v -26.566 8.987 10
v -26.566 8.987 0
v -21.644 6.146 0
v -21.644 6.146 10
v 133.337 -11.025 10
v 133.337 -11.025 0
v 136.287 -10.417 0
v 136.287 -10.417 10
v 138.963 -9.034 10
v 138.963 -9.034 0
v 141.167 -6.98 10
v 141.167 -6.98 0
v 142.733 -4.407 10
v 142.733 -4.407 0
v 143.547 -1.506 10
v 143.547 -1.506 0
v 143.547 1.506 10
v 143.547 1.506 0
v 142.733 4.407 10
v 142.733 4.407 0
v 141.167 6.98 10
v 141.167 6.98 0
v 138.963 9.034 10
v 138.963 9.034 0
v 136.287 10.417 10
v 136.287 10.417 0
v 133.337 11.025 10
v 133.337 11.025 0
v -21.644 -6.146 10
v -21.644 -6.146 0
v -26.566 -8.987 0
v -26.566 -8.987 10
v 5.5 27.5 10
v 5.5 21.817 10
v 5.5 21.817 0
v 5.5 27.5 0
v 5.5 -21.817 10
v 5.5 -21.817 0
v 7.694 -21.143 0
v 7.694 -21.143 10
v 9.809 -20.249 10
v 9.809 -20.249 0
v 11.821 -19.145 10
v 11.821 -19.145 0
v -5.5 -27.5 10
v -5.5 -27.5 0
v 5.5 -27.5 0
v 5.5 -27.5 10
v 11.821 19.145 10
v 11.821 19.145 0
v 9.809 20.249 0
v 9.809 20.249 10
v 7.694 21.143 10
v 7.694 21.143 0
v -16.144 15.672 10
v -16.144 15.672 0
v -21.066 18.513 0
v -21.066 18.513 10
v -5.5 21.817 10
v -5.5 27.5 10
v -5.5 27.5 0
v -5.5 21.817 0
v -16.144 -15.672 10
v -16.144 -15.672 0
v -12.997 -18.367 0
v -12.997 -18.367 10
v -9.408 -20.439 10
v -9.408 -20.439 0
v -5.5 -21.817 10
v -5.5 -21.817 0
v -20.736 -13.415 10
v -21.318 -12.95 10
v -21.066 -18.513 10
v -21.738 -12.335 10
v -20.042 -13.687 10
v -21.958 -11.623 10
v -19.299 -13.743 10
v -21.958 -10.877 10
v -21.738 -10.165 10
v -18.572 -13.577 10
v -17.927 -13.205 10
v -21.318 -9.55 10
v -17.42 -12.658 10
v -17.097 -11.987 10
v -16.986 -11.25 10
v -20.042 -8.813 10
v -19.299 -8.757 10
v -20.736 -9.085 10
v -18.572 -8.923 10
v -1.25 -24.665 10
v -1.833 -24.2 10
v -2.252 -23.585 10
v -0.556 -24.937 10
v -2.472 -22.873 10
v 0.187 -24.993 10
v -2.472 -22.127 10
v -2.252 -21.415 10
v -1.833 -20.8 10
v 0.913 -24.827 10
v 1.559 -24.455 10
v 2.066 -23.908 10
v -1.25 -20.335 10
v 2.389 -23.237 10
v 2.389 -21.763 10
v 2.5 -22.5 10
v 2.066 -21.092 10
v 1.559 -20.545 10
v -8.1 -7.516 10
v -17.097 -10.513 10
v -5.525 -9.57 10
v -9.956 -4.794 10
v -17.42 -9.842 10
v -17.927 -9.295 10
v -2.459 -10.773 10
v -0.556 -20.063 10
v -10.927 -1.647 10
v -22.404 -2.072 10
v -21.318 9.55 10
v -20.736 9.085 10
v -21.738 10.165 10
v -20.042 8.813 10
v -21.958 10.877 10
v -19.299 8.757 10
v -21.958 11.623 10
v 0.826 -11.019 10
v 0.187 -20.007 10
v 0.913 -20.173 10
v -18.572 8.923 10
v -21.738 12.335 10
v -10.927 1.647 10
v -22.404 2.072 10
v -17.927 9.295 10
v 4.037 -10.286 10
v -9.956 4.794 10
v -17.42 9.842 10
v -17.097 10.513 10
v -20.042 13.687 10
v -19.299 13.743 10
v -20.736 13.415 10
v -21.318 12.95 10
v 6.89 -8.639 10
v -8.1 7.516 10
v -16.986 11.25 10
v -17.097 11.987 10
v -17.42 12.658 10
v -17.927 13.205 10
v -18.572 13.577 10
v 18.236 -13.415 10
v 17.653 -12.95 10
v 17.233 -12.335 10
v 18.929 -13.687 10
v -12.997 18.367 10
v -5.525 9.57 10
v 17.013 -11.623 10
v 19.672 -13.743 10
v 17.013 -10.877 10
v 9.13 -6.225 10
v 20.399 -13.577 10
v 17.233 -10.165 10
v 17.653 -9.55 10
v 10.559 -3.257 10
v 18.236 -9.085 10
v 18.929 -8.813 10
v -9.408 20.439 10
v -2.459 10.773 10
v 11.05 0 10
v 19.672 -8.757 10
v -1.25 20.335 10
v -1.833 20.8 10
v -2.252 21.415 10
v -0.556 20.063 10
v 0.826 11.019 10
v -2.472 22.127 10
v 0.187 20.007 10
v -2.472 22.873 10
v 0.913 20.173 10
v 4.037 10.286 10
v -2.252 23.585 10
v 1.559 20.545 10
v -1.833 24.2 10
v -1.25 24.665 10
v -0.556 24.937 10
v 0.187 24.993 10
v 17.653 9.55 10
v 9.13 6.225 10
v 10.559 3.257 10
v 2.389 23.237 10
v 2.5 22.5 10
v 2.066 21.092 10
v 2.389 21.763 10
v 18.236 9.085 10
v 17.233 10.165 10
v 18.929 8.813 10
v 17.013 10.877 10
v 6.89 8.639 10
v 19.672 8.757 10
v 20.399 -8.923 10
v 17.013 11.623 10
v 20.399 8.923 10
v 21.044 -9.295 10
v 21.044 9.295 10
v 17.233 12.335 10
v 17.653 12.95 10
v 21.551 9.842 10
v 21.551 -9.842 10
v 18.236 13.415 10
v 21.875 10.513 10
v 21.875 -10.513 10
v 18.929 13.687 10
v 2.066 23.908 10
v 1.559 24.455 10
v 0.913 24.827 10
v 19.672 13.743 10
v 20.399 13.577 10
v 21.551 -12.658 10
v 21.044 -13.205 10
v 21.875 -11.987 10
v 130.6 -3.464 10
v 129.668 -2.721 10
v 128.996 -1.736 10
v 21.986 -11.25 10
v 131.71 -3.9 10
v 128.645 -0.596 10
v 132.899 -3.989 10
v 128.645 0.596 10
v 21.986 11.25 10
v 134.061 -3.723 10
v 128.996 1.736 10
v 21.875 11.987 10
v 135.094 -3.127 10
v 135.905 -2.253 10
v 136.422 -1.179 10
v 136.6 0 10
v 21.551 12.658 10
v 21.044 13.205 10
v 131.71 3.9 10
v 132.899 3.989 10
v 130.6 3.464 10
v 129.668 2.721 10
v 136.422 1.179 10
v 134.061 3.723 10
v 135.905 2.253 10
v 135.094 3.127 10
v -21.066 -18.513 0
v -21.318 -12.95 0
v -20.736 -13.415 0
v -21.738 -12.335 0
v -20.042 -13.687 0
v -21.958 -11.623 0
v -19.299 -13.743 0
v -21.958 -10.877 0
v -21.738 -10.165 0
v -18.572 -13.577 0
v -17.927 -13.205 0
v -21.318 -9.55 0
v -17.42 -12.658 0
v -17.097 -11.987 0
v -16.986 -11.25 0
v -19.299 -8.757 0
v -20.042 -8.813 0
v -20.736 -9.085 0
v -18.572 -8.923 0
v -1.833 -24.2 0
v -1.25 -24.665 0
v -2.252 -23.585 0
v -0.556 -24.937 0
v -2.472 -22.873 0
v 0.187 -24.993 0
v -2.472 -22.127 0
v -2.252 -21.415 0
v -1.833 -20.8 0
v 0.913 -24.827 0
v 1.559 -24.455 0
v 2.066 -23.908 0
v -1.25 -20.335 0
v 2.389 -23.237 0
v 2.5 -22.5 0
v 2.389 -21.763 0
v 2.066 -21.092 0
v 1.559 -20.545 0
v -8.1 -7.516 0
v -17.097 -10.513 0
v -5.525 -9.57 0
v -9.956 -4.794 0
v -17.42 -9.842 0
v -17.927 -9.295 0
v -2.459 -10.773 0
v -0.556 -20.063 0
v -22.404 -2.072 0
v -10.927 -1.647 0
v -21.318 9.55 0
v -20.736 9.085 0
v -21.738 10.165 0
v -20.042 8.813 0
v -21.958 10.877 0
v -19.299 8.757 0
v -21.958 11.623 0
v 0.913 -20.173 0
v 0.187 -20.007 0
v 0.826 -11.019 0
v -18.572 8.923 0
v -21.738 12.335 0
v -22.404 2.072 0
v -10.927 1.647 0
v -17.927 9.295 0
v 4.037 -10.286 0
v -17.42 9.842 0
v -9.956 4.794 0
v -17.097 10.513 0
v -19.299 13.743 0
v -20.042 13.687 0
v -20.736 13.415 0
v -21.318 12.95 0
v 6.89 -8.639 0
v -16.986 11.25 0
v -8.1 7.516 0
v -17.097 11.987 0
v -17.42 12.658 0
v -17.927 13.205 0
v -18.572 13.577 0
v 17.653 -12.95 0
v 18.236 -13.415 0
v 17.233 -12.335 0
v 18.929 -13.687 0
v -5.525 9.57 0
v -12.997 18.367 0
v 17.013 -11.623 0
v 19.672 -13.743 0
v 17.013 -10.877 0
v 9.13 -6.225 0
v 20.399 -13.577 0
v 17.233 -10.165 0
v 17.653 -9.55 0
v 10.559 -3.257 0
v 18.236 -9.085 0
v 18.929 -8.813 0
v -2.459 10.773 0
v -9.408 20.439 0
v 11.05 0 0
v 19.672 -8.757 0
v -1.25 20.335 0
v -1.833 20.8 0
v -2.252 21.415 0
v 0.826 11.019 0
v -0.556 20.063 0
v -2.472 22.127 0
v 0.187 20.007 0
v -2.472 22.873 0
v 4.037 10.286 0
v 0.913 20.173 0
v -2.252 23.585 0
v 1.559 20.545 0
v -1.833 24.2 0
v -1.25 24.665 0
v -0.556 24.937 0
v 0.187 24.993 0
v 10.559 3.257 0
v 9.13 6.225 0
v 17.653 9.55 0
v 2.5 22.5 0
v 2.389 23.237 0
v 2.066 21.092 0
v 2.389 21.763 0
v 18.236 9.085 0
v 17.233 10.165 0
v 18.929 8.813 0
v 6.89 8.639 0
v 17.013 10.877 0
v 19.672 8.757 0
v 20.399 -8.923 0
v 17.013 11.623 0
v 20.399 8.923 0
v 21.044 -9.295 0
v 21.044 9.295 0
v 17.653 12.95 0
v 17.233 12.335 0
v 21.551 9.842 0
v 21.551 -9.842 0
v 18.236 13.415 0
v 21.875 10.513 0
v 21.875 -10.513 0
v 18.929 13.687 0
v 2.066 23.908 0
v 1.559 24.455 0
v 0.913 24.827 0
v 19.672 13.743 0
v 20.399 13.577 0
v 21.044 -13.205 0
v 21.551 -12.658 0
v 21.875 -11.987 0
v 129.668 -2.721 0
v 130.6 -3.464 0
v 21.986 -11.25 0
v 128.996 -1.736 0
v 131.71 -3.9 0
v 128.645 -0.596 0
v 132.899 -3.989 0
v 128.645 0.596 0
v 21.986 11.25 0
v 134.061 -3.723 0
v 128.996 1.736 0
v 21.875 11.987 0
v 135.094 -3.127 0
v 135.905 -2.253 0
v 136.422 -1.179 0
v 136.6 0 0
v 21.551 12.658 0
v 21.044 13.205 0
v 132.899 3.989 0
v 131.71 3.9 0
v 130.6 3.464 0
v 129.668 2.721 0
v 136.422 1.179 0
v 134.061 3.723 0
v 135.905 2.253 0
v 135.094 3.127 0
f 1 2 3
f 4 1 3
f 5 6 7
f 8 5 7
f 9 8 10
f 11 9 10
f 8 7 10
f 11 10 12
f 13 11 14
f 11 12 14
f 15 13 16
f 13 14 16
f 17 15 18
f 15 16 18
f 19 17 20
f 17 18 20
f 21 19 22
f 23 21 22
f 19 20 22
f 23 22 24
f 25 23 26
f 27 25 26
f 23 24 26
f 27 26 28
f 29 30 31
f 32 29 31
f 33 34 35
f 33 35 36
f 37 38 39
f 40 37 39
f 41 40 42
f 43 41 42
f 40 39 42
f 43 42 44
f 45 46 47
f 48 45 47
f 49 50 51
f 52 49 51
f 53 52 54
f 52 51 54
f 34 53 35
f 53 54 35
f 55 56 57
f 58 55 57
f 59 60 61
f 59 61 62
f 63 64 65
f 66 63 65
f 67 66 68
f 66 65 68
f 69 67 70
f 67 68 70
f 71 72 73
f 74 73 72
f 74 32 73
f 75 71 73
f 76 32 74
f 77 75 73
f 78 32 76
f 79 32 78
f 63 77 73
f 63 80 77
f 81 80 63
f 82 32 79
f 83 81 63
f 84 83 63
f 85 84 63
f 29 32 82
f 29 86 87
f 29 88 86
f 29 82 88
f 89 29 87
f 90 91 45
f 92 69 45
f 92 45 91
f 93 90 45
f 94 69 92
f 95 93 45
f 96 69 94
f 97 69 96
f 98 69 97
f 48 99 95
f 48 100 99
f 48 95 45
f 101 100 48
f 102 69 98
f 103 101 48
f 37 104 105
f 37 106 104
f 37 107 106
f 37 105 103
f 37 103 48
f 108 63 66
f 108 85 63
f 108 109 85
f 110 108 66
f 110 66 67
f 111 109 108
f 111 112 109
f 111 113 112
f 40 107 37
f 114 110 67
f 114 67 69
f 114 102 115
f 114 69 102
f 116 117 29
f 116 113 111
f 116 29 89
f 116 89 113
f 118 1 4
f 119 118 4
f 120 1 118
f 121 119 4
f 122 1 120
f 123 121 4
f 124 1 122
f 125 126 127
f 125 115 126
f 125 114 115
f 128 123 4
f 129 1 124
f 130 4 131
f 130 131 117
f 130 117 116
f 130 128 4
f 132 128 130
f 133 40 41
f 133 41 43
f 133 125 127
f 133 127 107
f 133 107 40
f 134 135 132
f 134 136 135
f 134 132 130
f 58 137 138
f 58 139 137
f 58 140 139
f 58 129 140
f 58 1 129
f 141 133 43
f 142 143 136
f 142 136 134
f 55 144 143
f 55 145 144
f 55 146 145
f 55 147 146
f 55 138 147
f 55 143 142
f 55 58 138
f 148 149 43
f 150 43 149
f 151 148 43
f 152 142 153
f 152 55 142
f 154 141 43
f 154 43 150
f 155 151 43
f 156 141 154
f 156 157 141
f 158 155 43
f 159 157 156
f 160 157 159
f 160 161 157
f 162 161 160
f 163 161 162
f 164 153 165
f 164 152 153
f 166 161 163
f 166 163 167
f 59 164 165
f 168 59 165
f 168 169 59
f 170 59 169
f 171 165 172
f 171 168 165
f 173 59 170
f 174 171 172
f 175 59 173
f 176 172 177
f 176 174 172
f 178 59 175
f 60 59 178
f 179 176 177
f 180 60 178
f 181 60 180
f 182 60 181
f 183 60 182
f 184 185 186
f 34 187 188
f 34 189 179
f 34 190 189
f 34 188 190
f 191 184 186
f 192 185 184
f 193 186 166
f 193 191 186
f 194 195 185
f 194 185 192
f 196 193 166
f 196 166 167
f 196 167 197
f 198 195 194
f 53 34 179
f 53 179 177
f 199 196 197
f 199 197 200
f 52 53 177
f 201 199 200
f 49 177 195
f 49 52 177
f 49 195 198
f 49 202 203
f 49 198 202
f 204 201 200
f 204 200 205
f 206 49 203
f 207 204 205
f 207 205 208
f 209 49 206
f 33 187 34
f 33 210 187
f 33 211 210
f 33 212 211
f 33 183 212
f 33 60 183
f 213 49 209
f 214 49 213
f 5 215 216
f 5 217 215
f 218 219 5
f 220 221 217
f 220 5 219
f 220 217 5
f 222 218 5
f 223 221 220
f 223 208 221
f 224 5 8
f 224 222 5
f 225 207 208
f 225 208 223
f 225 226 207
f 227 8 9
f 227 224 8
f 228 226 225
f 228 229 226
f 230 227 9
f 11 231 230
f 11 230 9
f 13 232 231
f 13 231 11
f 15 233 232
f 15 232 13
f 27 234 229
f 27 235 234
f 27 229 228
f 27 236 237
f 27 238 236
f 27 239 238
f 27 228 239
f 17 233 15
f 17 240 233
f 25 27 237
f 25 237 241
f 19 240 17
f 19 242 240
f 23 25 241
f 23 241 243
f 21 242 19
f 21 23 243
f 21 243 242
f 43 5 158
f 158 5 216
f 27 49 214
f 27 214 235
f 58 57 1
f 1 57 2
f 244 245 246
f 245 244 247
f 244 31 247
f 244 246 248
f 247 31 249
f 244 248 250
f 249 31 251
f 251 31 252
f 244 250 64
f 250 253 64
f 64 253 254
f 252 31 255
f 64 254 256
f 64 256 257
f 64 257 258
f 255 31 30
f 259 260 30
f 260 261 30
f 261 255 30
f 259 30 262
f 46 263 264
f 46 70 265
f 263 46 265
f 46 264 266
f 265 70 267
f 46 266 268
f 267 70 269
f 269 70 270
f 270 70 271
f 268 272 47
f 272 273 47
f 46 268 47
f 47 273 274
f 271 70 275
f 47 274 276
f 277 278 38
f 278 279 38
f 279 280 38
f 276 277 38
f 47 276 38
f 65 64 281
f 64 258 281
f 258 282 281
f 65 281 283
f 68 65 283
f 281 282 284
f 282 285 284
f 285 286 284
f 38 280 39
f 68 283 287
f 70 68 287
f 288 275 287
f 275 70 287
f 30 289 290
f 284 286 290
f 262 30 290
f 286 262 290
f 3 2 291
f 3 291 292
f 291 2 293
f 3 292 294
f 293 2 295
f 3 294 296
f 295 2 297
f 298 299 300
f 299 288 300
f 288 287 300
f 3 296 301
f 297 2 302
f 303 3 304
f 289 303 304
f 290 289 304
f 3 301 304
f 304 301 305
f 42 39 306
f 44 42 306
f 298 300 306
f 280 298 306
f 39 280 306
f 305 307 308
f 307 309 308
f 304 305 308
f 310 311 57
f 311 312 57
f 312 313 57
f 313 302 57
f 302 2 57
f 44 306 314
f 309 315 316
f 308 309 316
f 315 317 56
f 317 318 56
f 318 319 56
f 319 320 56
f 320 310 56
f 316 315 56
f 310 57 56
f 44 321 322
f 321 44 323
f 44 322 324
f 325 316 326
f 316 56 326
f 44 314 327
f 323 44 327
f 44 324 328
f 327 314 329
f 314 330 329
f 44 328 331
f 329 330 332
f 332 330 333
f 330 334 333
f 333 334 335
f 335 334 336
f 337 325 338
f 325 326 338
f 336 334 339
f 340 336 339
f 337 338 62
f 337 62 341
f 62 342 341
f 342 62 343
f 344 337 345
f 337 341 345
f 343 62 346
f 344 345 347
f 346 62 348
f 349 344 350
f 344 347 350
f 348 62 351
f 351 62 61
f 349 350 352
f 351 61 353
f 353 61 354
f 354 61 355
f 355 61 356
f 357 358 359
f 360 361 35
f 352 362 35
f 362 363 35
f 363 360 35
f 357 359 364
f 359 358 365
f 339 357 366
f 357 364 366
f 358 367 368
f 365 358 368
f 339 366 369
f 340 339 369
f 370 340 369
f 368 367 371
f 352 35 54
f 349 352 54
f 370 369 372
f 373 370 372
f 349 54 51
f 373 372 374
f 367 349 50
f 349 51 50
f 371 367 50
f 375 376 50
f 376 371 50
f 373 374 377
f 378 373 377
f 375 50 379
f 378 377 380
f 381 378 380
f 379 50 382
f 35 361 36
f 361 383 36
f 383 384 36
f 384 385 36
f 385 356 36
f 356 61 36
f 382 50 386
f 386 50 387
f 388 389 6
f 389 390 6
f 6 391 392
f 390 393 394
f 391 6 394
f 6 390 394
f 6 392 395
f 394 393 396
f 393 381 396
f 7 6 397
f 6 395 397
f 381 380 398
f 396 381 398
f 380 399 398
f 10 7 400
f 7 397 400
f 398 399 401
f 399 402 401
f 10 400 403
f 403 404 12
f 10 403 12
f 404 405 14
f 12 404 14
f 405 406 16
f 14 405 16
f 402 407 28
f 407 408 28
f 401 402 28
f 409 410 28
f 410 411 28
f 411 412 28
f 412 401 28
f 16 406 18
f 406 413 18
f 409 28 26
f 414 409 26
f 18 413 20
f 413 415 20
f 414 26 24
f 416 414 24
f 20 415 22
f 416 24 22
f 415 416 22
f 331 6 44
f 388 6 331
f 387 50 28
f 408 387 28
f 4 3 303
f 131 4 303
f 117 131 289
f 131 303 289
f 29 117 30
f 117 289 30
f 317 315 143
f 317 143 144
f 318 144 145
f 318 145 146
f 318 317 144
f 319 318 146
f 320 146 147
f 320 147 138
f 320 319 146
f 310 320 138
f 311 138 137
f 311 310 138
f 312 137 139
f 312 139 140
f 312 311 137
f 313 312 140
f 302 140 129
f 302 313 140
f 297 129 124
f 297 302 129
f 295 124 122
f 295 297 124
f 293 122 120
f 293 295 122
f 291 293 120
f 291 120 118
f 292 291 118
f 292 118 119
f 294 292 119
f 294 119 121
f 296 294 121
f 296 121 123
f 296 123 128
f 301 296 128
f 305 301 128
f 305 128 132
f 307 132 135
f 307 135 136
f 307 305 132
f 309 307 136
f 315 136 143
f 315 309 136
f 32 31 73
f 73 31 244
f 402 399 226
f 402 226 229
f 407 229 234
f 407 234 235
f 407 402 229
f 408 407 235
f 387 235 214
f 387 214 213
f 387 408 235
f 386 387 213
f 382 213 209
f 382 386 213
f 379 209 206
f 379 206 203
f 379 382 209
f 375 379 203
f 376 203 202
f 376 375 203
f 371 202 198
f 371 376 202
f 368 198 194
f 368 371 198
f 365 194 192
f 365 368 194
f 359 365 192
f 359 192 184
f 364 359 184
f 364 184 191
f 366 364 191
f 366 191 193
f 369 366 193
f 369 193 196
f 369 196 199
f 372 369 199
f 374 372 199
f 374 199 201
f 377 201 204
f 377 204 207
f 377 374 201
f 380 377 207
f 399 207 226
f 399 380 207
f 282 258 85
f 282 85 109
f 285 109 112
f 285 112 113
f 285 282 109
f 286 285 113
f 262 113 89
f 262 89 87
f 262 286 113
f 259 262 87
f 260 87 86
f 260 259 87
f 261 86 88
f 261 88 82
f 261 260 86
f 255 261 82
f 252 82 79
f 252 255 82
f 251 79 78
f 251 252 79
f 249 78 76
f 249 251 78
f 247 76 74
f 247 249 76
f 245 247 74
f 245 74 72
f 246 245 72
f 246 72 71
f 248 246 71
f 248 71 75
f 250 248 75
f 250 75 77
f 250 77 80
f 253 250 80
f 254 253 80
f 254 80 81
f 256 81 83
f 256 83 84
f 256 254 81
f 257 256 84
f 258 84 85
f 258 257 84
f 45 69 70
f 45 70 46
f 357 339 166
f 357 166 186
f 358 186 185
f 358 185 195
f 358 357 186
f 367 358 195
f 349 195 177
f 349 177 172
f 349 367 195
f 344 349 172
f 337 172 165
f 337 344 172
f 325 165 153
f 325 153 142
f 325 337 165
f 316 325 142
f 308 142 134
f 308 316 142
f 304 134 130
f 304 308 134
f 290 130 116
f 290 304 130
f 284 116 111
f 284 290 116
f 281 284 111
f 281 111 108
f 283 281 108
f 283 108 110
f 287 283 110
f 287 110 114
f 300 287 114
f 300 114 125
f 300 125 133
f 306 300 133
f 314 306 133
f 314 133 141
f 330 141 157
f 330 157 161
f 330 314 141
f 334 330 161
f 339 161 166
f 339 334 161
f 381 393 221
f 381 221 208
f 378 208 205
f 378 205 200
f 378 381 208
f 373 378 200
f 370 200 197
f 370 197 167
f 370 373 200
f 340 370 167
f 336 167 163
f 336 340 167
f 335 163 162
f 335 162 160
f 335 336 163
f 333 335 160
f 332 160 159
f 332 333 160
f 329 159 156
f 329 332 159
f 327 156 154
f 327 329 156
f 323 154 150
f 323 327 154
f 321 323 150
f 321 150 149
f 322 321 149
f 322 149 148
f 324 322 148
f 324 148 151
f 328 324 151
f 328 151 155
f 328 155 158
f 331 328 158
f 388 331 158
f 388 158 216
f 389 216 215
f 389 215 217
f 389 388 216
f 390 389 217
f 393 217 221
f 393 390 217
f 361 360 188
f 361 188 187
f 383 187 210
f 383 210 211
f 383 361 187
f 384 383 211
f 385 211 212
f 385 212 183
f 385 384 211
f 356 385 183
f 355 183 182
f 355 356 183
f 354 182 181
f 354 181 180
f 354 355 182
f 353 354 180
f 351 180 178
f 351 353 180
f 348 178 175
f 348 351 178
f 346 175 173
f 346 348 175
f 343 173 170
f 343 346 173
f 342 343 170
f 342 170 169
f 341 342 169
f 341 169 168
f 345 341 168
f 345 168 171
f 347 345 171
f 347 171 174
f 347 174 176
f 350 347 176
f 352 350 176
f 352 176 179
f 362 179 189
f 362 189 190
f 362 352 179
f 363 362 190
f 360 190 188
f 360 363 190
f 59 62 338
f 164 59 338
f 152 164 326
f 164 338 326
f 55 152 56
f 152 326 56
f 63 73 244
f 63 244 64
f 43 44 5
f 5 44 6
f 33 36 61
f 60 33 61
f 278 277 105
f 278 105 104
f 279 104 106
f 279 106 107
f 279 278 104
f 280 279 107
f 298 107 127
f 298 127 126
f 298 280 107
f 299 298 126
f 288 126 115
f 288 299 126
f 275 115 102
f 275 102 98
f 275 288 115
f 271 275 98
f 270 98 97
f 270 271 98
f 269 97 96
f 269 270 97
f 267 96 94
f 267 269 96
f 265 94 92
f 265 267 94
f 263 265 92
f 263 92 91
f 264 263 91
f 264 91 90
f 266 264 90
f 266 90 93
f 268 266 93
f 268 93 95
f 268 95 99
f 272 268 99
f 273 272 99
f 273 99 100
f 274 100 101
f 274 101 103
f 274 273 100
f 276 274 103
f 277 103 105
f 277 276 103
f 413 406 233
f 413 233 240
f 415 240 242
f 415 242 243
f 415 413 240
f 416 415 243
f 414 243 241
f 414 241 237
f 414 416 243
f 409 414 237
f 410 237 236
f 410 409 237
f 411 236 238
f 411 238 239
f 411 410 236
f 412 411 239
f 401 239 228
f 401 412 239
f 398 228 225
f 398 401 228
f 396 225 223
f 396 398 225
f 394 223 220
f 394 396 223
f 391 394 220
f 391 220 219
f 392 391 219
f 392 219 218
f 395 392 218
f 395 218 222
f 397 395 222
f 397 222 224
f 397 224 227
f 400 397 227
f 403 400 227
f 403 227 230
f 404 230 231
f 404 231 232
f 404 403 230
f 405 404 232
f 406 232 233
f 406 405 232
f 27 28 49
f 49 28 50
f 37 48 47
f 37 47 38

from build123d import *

# Parameters (mm, degrees)
SKETCH_1_R      = 2.5
SKETCH_1_R_2    = 11.05
SKETCH_1_R_3    = 4
EXTRUDE_1_DEPTH = 10


with BuildPart() as part:
    # 草图1 → 凸台-拉伸1 (new body)
    with BuildSketch(Plane.XY):
        with BuildLine():
            ThreePointArc((11.821054836, 19.144520432), (8.76303822, 20.723396468), (5.5, 21.817424229))
            Line((5.5, 21.817424229), (5.5, 27.5))
            Line((5.5, 27.5), (-5.5, 27.5))
            Line((-5.5, 27.5), (-5.5, 21.817424229))
            ThreePointArc((-5.5, 21.817424229), (-11.25, 19.485571585), (-16.144443628, 15.671851835))
            Line((-16.144443628, 15.671851835), (-21.065698604, 18.513139721))
            Line((-21.065698604, 18.513139721), (-26.565698604, 8.986860279))
            Line((-26.565698604, 8.986860279), (-21.644443628, 6.145572394))
            ThreePointArc((-21.644443628, 6.145572394), (-22.5, 0), (-21.644443628, -6.145572394))
            Line((-21.644443628, -6.145572394), (-26.565698604, -8.986860279))
            Line((-26.565698604, -8.986860279), (-21.065698604, -18.513139721))
            Line((-21.065698604, -18.513139721), (-16.144443628, -15.671851835))
            ThreePointArc((-16.144443628, -15.671851835), (-11.25, -19.485571585), (-5.5, -21.817424229))
            Line((-5.5, -21.817424229), (-5.5, -27.5))
            Line((-5.5, -27.5), (5.5, -27.5))
            Line((5.5, -27.5), (5.5, -21.817424229))
            ThreePointArc((5.5, -21.817424229), (8.76303822, -20.723396468), (11.821054836, -19.144520432))
            Line((11.821054836, -19.144520432), (133.336666591, -11.0254171))
            ThreePointArc((133.336666591, -11.0254171), (143.649999924, 0), (133.336666591, 11.0254171))
            Line((133.336666591, 11.0254171), (11.821054836, 19.144520432))
        make_face()
        with Locations((19.485571585, -11.25)):
            Circle(SKETCH_1_R, mode=Mode.SUBTRACT)
        with Locations((19.485571585, 11.25)):
            Circle(SKETCH_1_R, mode=Mode.SUBTRACT)
        with Locations((-19.485571585, -11.25)):
            Circle(SKETCH_1_R, mode=Mode.SUBTRACT)
        with Locations((-19.485571585, 11.25)):
            Circle(SKETCH_1_R, mode=Mode.SUBTRACT)
        with Locations((0, -22.5)):
            Circle(SKETCH_1_R, mode=Mode.SUBTRACT)
        with Locations((0, 22.5)):
            Circle(SKETCH_1_R, mode=Mode.SUBTRACT)
        Circle(SKETCH_1_R_2, mode=Mode.SUBTRACT)
        with Locations((132.599999924, 0)):
            Circle(SKETCH_1_R_3, mode=Mode.SUBTRACT)
    extrude(amount=EXTRUDE_1_DEPTH)


solid = part.part
